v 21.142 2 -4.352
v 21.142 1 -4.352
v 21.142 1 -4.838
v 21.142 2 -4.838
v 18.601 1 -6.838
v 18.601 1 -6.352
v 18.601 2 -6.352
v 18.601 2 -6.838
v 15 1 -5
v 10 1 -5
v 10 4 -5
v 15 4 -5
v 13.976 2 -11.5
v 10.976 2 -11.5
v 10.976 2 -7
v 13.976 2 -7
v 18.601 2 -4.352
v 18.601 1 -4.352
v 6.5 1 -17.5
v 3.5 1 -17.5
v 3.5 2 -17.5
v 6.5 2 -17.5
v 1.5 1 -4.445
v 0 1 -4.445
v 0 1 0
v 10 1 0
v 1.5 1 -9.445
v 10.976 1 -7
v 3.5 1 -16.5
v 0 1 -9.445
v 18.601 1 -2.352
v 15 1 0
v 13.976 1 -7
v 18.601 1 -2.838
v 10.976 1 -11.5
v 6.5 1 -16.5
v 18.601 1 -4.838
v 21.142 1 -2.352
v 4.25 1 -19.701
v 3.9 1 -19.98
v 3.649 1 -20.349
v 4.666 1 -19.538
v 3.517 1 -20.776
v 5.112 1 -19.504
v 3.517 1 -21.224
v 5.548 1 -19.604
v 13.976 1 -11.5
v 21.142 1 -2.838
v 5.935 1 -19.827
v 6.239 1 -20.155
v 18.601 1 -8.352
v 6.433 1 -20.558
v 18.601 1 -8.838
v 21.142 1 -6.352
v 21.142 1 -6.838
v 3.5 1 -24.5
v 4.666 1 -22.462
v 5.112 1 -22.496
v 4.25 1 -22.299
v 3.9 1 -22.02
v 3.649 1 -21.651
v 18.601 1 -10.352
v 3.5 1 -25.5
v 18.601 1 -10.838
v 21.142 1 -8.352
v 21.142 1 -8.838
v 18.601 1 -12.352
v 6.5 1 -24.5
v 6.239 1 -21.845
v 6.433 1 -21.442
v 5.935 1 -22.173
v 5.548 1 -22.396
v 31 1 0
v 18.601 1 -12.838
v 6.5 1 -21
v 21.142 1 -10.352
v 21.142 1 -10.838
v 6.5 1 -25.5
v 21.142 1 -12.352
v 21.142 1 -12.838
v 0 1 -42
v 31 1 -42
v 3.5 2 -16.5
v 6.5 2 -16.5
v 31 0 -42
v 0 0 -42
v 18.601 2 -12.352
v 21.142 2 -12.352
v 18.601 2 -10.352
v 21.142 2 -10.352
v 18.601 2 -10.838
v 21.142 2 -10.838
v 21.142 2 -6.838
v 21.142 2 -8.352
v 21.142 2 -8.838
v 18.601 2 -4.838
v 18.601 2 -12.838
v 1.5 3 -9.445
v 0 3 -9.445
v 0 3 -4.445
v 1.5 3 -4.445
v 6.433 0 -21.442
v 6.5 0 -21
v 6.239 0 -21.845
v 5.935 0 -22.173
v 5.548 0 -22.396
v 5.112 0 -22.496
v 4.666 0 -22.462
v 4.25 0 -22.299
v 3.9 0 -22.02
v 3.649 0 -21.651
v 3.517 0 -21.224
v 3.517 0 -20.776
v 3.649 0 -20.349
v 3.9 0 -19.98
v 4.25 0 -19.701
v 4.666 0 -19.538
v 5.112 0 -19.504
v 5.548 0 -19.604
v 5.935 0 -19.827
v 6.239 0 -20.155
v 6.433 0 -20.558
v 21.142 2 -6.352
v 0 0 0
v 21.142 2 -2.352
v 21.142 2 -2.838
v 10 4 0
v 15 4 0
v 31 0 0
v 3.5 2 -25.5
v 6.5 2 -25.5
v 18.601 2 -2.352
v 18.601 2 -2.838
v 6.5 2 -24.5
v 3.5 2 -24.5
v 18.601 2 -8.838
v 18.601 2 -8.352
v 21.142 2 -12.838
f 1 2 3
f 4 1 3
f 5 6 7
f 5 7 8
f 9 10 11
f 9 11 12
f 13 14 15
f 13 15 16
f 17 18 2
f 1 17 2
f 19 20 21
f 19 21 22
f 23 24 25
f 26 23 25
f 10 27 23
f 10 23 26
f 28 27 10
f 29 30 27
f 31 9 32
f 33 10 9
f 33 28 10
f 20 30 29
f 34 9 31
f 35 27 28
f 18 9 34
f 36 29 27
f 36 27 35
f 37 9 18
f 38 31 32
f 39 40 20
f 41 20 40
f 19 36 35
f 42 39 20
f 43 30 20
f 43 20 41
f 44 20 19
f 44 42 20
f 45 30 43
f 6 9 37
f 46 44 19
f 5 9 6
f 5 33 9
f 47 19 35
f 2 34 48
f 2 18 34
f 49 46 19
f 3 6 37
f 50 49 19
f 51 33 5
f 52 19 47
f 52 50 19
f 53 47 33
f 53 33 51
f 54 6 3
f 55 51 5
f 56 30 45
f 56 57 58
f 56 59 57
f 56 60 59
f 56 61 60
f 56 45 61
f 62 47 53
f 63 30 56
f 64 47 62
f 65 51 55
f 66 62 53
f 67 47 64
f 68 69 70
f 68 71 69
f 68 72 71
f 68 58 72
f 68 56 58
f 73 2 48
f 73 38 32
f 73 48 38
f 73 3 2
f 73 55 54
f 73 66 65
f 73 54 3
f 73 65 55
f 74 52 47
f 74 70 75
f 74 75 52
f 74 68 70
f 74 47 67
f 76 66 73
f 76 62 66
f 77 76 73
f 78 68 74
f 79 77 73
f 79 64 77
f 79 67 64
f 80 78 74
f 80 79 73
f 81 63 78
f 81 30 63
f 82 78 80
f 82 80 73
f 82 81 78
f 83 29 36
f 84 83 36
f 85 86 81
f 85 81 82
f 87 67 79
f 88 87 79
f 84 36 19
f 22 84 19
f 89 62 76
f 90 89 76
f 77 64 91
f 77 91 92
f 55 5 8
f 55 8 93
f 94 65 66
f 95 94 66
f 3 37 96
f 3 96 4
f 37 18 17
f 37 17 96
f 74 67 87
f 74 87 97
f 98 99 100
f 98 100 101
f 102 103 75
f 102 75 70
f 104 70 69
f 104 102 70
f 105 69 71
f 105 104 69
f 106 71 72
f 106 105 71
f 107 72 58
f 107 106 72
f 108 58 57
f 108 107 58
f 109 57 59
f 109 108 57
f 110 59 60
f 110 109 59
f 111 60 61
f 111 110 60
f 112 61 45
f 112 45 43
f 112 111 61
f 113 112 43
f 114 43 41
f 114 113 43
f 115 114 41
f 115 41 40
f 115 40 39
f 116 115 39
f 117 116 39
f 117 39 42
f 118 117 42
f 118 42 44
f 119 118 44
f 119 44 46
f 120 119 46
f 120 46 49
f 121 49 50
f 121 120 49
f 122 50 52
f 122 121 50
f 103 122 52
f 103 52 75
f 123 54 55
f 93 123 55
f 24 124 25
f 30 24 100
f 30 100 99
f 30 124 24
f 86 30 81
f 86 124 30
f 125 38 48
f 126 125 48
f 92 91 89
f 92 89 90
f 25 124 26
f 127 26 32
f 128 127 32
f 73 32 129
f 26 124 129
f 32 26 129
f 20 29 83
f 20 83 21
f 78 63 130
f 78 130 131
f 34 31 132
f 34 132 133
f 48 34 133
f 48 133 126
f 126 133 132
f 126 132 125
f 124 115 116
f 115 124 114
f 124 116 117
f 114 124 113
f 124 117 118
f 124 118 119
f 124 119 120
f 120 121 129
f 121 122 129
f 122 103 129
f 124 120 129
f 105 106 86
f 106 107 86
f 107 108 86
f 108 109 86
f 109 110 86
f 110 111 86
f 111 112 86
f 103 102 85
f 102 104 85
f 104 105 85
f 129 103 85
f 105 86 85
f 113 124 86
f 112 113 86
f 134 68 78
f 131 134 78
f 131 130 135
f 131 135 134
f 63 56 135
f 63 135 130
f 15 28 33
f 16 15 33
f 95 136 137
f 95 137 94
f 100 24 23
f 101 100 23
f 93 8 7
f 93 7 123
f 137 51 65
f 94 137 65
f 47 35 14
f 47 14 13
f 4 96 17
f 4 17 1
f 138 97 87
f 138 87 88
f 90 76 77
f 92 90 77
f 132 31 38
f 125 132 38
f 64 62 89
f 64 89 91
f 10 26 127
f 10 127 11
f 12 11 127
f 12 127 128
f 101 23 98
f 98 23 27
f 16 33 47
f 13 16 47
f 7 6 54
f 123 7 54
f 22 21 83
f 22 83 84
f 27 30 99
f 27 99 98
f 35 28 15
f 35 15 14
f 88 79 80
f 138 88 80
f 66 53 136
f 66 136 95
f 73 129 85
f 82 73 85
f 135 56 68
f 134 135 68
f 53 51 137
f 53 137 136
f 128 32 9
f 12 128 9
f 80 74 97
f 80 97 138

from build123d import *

# Parameters (mm, degrees)
SKETCH_1_W      = 31
SKETCH_1_H      = 42
SKETCH_1_R      = 1.5
EXTRUDE_1_DEPTH = 1
SKETCH_2_W      = 5
SKETCH_2_H      = 5
EXTRUDE_2_DEPTH = 3
SKETCH_3_W      = 3
SKETCH_3_H      = 4.5
SKETCH_3_W_2    = 2.541472094
SKETCH_3_H_2    = 0.485869665
EXTRUDE_3_DEPTH = 1
SKETCH_4_W      = 3
SKETCH_4_H      = 1
EXTRUDE_4_DEPTH = 1
SKETCH_5_W      = 1.5
SKETCH_5_H      = 5
EXTRUDE_5_DEPTH = 2


with BuildPart() as part:
    # 草圖1 → 填料-伸長1 (new body)
    with BuildSketch(Plane(origin=(0, 0, 0), x_dir=(1, 0, 0), z_dir=(0, 1, 0))):
        with Locations((15.5, 21)):
            Rectangle(SKETCH_1_W, SKETCH_1_H)
        with Locations((5, 21)):
            Circle(SKETCH_1_R, mode=Mode.SUBTRACT)
    extrude(amount=EXTRUDE_1_DEPTH)

    # 草圖2 → 填料-伸長2 (add)
    with BuildSketch(Plane(origin=(0, 1, 0), x_dir=(1, 0, 0), z_dir=(0, 1, 0))):
        with Locations((12.5, 2.5)):
            Rectangle(SKETCH_2_W, SKETCH_2_H)
    extrude(amount=EXTRUDE_2_DEPTH)

    # 草圖3 → 填料-伸長3 (add)
    with BuildSketch(Plane(origin=(0, 1, 0), x_dir=(1, 0, 0), z_dir=(0, 1, 0))):
        with Locations((12.476364023, 9.25)):
            Rectangle(SKETCH_3_W, SKETCH_3_H)
        with Locations((19.871516351, 12.595108575)):
            Rectangle(SKETCH_3_W_2, SKETCH_3_H_2)
        with Locations((19.871516351, 10.595108575)):
            Rectangle(SKETCH_3_W_2, SKETCH_3_H_2)
        with Locations((19.871516351, 8.595108574)):
            Rectangle(SKETCH_3_W_2, SKETCH_3_H_2)
        with Locations((19.871516351, 6.595108575)):
            Rectangle(SKETCH_3_W_2, SKETCH_3_H_2)
        with Locations((19.871516351, 4.595108575)):
            Rectangle(SKETCH_3_W_2, SKETCH_3_H_2)
        with Locations((19.871516351, 2.595108575)):
            Rectangle(SKETCH_3_W_2, SKETCH_3_H_2)
    extrude(amount=EXTRUDE_3_DEPTH)

    # 草圖4 → 填料-伸長4 (add)
    with BuildSketch(Plane(origin=(0, 1, 0), x_dir=(1, 0, 0), z_dir=(0, 1, 0))):
        with Locations((5, 25)):
            Rectangle(SKETCH_4_W, SKETCH_4_H)
        with Locations((5, 17)):
            Rectangle(SKETCH_4_W, SKETCH_4_H)
    extrude(amount=EXTRUDE_4_DEPTH)

    # 草圖5 → 填料-伸長5 (add)
    with BuildSketch(Plane(origin=(0, 1, 0), x_dir=(1, 0, 0), z_dir=(0, 1, 0))):
        with Locations((0.75, 6.944626386)):
            Rectangle(SKETCH_5_W, SKETCH_5_H)
    extrude(amount=EXTRUDE_5_DEPTH)


solid = part.part
